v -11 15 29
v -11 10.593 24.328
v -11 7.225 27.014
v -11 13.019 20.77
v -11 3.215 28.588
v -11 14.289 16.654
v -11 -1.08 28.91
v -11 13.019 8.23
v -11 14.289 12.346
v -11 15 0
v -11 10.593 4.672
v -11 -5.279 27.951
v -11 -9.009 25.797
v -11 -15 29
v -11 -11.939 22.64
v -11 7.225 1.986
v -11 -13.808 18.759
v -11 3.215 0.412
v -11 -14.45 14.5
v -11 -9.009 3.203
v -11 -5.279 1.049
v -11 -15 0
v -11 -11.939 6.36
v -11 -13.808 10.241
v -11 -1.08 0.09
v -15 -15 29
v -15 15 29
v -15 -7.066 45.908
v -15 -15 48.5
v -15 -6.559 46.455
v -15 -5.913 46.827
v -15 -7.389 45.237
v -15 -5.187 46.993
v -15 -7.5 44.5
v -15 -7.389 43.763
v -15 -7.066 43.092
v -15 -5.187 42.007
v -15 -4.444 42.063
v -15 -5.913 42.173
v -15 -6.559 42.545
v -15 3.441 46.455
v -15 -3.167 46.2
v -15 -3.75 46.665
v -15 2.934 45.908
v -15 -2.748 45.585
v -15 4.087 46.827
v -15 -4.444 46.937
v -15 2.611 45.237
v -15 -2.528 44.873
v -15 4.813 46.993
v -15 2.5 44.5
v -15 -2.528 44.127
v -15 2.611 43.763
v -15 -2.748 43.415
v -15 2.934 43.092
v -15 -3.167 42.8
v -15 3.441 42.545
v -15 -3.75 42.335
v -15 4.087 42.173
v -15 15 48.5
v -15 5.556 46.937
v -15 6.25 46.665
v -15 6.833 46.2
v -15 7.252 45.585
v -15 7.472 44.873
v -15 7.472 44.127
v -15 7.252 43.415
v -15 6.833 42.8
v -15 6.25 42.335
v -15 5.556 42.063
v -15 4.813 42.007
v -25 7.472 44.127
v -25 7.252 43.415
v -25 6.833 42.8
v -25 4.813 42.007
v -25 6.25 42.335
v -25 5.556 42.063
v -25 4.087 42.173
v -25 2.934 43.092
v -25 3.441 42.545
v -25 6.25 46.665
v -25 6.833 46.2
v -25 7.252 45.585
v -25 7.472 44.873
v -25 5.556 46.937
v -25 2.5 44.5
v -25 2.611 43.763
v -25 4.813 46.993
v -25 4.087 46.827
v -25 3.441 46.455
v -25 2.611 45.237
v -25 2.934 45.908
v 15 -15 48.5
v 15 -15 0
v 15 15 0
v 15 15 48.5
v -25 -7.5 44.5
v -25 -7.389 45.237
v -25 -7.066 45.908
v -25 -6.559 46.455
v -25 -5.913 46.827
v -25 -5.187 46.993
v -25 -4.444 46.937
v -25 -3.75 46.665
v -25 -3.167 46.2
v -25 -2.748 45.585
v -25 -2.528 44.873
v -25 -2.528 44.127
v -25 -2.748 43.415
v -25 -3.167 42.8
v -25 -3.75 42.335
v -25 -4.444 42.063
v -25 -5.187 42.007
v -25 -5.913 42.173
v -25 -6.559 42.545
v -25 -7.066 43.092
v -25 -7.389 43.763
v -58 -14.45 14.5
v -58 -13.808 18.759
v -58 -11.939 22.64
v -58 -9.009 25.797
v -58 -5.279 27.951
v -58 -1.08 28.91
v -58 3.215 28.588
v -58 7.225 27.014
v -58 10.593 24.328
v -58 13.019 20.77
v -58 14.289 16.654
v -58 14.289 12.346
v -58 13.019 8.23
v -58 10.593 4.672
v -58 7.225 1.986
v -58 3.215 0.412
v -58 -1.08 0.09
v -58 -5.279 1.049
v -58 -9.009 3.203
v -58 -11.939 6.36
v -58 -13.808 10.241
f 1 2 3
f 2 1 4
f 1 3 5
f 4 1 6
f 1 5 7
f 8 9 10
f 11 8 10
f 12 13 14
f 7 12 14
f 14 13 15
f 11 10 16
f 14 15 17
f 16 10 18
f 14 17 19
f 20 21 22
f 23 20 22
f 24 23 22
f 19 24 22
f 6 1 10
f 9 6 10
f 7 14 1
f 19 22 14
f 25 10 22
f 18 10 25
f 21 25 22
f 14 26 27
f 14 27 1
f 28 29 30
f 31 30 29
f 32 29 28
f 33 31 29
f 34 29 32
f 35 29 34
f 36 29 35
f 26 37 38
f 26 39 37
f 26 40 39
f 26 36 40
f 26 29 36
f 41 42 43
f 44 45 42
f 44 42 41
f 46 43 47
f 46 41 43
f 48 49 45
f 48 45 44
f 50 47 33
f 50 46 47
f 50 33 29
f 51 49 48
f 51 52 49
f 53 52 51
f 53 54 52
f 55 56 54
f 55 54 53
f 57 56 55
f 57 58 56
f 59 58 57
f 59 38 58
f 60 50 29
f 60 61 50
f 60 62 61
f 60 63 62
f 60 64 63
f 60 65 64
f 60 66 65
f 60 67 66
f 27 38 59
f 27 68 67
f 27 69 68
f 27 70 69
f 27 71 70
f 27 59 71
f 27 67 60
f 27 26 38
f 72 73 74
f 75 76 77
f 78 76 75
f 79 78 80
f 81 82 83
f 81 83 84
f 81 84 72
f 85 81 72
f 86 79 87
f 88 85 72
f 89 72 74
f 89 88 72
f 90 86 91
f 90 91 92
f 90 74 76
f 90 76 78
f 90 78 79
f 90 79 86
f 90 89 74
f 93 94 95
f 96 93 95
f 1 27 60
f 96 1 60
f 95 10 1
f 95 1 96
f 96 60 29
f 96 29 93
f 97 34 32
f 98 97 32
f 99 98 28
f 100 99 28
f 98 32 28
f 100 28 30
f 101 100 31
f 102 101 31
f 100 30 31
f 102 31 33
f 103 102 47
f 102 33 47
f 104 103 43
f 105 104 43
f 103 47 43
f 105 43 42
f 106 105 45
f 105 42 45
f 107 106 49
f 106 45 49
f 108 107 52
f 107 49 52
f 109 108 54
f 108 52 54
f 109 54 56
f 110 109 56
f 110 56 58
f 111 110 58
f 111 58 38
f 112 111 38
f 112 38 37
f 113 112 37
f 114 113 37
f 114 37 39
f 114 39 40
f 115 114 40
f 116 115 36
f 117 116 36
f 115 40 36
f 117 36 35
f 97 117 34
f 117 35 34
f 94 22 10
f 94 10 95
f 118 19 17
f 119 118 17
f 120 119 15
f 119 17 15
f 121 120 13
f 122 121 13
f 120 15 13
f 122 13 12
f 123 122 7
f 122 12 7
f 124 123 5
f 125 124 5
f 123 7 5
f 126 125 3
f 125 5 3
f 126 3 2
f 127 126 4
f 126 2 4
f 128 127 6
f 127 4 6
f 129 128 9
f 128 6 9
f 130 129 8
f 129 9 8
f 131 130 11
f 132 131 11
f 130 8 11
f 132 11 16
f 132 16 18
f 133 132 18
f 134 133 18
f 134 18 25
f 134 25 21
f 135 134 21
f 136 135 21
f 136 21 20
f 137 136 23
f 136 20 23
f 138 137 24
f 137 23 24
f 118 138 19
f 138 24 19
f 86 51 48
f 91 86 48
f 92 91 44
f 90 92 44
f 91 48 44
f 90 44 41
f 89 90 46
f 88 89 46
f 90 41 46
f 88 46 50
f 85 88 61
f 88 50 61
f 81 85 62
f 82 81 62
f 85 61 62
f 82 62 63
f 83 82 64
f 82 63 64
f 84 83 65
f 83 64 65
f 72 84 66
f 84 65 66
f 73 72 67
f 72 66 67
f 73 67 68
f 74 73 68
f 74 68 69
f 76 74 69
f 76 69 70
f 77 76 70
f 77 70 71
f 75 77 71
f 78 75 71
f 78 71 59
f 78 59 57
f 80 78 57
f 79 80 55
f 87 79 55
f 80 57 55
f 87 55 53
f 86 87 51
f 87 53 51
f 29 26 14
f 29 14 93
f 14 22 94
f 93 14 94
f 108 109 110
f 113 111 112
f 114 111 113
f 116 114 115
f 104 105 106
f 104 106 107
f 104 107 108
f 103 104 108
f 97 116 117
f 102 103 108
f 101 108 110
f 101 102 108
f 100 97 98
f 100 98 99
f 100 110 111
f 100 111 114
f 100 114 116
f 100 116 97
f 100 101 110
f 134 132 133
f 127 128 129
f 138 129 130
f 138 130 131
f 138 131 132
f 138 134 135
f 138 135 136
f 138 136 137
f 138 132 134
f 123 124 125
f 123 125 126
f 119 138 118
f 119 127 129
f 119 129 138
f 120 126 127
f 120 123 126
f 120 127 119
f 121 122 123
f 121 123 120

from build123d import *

# Parameters (mm, degrees)
F0_W     = 30
F0_H     = 30
F1_DEPTH = 48.5
F2_W     = 4
F2_H     = 30
F3_DEPTH = 29
F4_R     = 14.45
F5_DEPTH = 47
F6_R     = 2.5
F7_DEPTH = 10


with BuildPart() as f1:
    # F0 (on Top) → F1 (new body)
    with BuildSketch(Plane.XY):
        Rectangle(F0_W, F0_H)
    extrude(amount=F1_DEPTH)

    # F2 (on face) → F3 (cut)
    with BuildSketch(Plane(origin=(0, 0, 0), x_dir=(1, 0, 0), z_dir=(0, 0, -1))):
        with Locations((-13, 0)):
            Rectangle(F2_W, F2_H)
    extrude(amount=-F3_DEPTH, mode=Mode.SUBTRACT)

    # F4 (on face) → F5 (join)
    with BuildSketch(Plane(origin=(-11, 0, 0), x_dir=(0, -1, 0), z_dir=(-1, 0, 0))):
        with Locations((0, 14.5)):
            Circle(F4_R)
    extrude(amount=F5_DEPTH)

    # F6 (on face) → F7 (join)
    with BuildSketch(Plane(origin=(-15, 0, 0), x_dir=(0, -1, 0), z_dir=(-1, 0, 0))):
        with Locations((5, 44.5)):
            Circle(F6_R)
        with Locations((-5, 44.5)):
            Circle(F6_R)
    extrude(amount=F7_DEPTH)


solid = f1.part
